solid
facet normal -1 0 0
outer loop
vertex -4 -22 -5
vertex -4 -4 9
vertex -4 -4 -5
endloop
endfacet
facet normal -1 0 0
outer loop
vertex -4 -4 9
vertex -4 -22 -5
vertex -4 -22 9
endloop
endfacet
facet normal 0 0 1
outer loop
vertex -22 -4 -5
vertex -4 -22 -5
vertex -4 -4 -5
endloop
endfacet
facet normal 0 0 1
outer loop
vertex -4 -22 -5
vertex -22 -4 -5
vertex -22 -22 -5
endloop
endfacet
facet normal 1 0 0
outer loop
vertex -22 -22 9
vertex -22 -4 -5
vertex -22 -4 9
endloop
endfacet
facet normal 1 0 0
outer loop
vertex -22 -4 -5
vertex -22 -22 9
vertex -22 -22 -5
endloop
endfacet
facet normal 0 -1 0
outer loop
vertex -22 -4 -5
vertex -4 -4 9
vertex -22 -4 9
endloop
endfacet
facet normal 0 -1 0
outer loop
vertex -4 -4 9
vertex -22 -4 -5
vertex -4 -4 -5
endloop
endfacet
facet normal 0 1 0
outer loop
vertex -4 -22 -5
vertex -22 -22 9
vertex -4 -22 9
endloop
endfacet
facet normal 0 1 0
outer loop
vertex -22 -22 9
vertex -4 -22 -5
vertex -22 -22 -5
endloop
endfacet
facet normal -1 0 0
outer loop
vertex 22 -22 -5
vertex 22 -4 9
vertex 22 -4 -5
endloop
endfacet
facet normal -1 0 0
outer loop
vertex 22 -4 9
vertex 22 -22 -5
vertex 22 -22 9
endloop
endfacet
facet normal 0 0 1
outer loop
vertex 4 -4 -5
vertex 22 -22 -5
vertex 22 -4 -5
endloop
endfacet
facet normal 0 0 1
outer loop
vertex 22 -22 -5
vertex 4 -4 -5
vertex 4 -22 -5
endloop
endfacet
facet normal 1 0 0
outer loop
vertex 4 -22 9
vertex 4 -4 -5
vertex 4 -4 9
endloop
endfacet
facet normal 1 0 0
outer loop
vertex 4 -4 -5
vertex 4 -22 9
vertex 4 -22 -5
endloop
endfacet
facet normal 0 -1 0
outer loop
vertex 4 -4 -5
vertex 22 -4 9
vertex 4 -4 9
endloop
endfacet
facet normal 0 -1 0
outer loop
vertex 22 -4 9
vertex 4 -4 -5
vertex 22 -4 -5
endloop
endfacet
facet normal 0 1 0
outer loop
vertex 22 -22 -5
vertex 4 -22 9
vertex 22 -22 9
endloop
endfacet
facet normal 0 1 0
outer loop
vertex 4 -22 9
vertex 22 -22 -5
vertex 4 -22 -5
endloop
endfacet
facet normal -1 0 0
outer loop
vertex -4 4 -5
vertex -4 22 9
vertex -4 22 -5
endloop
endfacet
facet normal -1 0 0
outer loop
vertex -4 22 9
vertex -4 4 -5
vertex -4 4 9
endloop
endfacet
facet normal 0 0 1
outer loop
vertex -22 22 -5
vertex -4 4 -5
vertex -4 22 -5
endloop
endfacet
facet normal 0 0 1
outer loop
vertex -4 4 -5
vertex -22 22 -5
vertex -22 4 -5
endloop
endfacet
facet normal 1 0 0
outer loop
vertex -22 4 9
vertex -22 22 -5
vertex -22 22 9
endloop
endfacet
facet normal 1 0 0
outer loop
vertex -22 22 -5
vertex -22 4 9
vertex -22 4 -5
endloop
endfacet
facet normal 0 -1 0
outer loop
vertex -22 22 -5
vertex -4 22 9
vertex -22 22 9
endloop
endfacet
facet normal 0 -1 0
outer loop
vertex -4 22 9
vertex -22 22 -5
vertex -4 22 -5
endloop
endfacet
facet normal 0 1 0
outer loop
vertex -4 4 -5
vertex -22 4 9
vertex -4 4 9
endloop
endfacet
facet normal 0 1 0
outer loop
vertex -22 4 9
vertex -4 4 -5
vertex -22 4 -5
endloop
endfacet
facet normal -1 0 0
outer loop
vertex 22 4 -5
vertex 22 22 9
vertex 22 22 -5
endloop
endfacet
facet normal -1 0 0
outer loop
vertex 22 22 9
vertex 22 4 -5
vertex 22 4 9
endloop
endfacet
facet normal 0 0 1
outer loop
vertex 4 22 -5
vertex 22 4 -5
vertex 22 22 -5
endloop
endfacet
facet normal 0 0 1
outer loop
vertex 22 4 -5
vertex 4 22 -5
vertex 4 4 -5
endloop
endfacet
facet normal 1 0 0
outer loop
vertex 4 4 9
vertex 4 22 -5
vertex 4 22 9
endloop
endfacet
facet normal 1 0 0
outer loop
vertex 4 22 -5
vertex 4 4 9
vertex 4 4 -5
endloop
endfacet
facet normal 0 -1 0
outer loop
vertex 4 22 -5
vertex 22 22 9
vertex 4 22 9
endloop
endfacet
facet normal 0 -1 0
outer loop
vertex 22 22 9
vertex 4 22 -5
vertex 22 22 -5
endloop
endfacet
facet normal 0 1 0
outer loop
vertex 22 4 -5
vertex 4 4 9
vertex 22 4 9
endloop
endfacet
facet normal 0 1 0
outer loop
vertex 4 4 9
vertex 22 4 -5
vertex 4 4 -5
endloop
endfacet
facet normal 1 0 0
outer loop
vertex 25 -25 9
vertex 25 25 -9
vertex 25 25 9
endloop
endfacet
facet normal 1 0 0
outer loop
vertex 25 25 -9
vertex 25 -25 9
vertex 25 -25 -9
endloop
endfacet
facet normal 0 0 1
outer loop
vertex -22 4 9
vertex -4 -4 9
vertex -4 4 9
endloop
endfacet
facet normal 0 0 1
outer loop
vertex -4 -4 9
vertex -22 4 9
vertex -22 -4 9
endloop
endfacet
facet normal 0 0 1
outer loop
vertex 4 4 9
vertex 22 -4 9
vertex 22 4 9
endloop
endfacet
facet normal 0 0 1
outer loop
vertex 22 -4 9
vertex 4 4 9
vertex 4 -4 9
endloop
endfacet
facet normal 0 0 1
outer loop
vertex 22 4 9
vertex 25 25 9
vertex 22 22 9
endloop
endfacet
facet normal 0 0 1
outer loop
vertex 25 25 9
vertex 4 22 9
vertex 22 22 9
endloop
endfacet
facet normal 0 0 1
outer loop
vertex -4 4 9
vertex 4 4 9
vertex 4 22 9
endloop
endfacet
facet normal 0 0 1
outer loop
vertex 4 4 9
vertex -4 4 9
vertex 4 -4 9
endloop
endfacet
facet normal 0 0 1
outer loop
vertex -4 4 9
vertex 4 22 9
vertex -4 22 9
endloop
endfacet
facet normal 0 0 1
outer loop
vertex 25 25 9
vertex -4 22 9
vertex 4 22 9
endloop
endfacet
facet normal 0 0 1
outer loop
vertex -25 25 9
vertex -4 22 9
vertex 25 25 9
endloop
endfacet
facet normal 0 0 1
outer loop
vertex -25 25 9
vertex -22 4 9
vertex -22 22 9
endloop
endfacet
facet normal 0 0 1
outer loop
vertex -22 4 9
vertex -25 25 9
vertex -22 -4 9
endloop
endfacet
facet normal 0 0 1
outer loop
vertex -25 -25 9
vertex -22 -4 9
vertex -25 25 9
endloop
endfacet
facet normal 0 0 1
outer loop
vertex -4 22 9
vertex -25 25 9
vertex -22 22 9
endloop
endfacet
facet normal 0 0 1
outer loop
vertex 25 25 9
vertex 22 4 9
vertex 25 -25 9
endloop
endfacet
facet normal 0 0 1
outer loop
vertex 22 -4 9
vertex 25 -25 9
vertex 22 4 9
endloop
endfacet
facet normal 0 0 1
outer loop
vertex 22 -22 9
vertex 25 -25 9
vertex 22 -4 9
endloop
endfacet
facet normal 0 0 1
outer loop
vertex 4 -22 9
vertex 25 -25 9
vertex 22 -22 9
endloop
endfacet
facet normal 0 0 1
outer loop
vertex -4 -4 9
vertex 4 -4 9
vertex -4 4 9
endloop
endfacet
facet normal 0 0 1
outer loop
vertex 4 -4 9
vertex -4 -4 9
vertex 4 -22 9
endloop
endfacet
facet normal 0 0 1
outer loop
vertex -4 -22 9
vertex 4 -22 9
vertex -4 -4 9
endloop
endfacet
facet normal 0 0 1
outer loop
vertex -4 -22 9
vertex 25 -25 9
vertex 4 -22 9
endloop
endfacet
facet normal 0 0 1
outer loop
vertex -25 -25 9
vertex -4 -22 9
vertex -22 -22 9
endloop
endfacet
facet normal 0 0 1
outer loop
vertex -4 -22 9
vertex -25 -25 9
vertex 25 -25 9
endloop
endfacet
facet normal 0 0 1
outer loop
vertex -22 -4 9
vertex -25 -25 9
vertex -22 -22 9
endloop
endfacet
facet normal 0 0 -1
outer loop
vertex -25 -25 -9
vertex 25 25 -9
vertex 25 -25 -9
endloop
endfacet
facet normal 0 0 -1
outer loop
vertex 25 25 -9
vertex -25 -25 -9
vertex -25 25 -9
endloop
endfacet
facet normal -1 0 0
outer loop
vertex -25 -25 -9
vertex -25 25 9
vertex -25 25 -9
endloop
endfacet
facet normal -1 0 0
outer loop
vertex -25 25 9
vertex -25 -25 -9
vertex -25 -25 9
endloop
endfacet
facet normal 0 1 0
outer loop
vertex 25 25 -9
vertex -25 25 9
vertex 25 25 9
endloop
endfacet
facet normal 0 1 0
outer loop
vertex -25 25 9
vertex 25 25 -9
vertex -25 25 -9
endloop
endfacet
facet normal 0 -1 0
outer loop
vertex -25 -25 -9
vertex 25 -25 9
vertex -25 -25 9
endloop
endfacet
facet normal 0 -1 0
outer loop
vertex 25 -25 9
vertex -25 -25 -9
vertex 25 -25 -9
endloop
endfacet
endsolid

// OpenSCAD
$fn = 32;

// ----------------------------------------------------------------------
// Pocket plate 50 x 50 x 18
// 2 x 2 pockets 18 mm square, 14 mm deep
// ----------------------------------------------------------------------

// --- parameters (mm) ---
thickness = 18;  // plate thickness
floor_t = 4;     // material left under each pocket
pocket = 18;     // pocket side length
pitch_x = 26;    // pocket pitch along X
pitch_y = 26;    // pocket pitch along Y
cols = 2;        // pockets per row
rows = 2;        // rows of pockets

// --- derived feature positions (mm) ---
depth = thickness - floor_t;        // = 14   pocket depth, down to the floor
span_x = (cols - 1) * pitch_x;      // = 26   distance between outer pockets
span_y = (rows - 1) * pitch_y;      // = 26   distance between outer pocket rows
origin_x = -span_x / 2;             // = -13   X of the first pocket
origin_y = -span_y / 2;             // = -13   Y of the first pocket
plate = [span_x + pocket + 6, span_y + pocket + 6, thickness];  // = [50, 50, 18]   overall size: pockets plus 3 mm of wall on each side
feature_centers = [
  [origin_x + 0 * pitch_x, origin_y + 0 * pitch_y],
  [origin_x + 1 * pitch_x, origin_y + 0 * pitch_y],
  [origin_x + 0 * pitch_x, origin_y + 1 * pitch_y],
  [origin_x + 1 * pitch_x, origin_y + 1 * pitch_y]
];   // pocket centres, used verbatim by the cutter loop

// plate outline, then one pocket per centre in feature_centers
difference() {
  cube(plate, center = true);
  for (centre = feature_centers)
    translate([centre[0] - pocket / 2, centre[1] - pocket / 2, plate[2] / 2 - depth])
      cube([pocket, pocket, depth + 1]);  // centred on the declared pocket centre
}
